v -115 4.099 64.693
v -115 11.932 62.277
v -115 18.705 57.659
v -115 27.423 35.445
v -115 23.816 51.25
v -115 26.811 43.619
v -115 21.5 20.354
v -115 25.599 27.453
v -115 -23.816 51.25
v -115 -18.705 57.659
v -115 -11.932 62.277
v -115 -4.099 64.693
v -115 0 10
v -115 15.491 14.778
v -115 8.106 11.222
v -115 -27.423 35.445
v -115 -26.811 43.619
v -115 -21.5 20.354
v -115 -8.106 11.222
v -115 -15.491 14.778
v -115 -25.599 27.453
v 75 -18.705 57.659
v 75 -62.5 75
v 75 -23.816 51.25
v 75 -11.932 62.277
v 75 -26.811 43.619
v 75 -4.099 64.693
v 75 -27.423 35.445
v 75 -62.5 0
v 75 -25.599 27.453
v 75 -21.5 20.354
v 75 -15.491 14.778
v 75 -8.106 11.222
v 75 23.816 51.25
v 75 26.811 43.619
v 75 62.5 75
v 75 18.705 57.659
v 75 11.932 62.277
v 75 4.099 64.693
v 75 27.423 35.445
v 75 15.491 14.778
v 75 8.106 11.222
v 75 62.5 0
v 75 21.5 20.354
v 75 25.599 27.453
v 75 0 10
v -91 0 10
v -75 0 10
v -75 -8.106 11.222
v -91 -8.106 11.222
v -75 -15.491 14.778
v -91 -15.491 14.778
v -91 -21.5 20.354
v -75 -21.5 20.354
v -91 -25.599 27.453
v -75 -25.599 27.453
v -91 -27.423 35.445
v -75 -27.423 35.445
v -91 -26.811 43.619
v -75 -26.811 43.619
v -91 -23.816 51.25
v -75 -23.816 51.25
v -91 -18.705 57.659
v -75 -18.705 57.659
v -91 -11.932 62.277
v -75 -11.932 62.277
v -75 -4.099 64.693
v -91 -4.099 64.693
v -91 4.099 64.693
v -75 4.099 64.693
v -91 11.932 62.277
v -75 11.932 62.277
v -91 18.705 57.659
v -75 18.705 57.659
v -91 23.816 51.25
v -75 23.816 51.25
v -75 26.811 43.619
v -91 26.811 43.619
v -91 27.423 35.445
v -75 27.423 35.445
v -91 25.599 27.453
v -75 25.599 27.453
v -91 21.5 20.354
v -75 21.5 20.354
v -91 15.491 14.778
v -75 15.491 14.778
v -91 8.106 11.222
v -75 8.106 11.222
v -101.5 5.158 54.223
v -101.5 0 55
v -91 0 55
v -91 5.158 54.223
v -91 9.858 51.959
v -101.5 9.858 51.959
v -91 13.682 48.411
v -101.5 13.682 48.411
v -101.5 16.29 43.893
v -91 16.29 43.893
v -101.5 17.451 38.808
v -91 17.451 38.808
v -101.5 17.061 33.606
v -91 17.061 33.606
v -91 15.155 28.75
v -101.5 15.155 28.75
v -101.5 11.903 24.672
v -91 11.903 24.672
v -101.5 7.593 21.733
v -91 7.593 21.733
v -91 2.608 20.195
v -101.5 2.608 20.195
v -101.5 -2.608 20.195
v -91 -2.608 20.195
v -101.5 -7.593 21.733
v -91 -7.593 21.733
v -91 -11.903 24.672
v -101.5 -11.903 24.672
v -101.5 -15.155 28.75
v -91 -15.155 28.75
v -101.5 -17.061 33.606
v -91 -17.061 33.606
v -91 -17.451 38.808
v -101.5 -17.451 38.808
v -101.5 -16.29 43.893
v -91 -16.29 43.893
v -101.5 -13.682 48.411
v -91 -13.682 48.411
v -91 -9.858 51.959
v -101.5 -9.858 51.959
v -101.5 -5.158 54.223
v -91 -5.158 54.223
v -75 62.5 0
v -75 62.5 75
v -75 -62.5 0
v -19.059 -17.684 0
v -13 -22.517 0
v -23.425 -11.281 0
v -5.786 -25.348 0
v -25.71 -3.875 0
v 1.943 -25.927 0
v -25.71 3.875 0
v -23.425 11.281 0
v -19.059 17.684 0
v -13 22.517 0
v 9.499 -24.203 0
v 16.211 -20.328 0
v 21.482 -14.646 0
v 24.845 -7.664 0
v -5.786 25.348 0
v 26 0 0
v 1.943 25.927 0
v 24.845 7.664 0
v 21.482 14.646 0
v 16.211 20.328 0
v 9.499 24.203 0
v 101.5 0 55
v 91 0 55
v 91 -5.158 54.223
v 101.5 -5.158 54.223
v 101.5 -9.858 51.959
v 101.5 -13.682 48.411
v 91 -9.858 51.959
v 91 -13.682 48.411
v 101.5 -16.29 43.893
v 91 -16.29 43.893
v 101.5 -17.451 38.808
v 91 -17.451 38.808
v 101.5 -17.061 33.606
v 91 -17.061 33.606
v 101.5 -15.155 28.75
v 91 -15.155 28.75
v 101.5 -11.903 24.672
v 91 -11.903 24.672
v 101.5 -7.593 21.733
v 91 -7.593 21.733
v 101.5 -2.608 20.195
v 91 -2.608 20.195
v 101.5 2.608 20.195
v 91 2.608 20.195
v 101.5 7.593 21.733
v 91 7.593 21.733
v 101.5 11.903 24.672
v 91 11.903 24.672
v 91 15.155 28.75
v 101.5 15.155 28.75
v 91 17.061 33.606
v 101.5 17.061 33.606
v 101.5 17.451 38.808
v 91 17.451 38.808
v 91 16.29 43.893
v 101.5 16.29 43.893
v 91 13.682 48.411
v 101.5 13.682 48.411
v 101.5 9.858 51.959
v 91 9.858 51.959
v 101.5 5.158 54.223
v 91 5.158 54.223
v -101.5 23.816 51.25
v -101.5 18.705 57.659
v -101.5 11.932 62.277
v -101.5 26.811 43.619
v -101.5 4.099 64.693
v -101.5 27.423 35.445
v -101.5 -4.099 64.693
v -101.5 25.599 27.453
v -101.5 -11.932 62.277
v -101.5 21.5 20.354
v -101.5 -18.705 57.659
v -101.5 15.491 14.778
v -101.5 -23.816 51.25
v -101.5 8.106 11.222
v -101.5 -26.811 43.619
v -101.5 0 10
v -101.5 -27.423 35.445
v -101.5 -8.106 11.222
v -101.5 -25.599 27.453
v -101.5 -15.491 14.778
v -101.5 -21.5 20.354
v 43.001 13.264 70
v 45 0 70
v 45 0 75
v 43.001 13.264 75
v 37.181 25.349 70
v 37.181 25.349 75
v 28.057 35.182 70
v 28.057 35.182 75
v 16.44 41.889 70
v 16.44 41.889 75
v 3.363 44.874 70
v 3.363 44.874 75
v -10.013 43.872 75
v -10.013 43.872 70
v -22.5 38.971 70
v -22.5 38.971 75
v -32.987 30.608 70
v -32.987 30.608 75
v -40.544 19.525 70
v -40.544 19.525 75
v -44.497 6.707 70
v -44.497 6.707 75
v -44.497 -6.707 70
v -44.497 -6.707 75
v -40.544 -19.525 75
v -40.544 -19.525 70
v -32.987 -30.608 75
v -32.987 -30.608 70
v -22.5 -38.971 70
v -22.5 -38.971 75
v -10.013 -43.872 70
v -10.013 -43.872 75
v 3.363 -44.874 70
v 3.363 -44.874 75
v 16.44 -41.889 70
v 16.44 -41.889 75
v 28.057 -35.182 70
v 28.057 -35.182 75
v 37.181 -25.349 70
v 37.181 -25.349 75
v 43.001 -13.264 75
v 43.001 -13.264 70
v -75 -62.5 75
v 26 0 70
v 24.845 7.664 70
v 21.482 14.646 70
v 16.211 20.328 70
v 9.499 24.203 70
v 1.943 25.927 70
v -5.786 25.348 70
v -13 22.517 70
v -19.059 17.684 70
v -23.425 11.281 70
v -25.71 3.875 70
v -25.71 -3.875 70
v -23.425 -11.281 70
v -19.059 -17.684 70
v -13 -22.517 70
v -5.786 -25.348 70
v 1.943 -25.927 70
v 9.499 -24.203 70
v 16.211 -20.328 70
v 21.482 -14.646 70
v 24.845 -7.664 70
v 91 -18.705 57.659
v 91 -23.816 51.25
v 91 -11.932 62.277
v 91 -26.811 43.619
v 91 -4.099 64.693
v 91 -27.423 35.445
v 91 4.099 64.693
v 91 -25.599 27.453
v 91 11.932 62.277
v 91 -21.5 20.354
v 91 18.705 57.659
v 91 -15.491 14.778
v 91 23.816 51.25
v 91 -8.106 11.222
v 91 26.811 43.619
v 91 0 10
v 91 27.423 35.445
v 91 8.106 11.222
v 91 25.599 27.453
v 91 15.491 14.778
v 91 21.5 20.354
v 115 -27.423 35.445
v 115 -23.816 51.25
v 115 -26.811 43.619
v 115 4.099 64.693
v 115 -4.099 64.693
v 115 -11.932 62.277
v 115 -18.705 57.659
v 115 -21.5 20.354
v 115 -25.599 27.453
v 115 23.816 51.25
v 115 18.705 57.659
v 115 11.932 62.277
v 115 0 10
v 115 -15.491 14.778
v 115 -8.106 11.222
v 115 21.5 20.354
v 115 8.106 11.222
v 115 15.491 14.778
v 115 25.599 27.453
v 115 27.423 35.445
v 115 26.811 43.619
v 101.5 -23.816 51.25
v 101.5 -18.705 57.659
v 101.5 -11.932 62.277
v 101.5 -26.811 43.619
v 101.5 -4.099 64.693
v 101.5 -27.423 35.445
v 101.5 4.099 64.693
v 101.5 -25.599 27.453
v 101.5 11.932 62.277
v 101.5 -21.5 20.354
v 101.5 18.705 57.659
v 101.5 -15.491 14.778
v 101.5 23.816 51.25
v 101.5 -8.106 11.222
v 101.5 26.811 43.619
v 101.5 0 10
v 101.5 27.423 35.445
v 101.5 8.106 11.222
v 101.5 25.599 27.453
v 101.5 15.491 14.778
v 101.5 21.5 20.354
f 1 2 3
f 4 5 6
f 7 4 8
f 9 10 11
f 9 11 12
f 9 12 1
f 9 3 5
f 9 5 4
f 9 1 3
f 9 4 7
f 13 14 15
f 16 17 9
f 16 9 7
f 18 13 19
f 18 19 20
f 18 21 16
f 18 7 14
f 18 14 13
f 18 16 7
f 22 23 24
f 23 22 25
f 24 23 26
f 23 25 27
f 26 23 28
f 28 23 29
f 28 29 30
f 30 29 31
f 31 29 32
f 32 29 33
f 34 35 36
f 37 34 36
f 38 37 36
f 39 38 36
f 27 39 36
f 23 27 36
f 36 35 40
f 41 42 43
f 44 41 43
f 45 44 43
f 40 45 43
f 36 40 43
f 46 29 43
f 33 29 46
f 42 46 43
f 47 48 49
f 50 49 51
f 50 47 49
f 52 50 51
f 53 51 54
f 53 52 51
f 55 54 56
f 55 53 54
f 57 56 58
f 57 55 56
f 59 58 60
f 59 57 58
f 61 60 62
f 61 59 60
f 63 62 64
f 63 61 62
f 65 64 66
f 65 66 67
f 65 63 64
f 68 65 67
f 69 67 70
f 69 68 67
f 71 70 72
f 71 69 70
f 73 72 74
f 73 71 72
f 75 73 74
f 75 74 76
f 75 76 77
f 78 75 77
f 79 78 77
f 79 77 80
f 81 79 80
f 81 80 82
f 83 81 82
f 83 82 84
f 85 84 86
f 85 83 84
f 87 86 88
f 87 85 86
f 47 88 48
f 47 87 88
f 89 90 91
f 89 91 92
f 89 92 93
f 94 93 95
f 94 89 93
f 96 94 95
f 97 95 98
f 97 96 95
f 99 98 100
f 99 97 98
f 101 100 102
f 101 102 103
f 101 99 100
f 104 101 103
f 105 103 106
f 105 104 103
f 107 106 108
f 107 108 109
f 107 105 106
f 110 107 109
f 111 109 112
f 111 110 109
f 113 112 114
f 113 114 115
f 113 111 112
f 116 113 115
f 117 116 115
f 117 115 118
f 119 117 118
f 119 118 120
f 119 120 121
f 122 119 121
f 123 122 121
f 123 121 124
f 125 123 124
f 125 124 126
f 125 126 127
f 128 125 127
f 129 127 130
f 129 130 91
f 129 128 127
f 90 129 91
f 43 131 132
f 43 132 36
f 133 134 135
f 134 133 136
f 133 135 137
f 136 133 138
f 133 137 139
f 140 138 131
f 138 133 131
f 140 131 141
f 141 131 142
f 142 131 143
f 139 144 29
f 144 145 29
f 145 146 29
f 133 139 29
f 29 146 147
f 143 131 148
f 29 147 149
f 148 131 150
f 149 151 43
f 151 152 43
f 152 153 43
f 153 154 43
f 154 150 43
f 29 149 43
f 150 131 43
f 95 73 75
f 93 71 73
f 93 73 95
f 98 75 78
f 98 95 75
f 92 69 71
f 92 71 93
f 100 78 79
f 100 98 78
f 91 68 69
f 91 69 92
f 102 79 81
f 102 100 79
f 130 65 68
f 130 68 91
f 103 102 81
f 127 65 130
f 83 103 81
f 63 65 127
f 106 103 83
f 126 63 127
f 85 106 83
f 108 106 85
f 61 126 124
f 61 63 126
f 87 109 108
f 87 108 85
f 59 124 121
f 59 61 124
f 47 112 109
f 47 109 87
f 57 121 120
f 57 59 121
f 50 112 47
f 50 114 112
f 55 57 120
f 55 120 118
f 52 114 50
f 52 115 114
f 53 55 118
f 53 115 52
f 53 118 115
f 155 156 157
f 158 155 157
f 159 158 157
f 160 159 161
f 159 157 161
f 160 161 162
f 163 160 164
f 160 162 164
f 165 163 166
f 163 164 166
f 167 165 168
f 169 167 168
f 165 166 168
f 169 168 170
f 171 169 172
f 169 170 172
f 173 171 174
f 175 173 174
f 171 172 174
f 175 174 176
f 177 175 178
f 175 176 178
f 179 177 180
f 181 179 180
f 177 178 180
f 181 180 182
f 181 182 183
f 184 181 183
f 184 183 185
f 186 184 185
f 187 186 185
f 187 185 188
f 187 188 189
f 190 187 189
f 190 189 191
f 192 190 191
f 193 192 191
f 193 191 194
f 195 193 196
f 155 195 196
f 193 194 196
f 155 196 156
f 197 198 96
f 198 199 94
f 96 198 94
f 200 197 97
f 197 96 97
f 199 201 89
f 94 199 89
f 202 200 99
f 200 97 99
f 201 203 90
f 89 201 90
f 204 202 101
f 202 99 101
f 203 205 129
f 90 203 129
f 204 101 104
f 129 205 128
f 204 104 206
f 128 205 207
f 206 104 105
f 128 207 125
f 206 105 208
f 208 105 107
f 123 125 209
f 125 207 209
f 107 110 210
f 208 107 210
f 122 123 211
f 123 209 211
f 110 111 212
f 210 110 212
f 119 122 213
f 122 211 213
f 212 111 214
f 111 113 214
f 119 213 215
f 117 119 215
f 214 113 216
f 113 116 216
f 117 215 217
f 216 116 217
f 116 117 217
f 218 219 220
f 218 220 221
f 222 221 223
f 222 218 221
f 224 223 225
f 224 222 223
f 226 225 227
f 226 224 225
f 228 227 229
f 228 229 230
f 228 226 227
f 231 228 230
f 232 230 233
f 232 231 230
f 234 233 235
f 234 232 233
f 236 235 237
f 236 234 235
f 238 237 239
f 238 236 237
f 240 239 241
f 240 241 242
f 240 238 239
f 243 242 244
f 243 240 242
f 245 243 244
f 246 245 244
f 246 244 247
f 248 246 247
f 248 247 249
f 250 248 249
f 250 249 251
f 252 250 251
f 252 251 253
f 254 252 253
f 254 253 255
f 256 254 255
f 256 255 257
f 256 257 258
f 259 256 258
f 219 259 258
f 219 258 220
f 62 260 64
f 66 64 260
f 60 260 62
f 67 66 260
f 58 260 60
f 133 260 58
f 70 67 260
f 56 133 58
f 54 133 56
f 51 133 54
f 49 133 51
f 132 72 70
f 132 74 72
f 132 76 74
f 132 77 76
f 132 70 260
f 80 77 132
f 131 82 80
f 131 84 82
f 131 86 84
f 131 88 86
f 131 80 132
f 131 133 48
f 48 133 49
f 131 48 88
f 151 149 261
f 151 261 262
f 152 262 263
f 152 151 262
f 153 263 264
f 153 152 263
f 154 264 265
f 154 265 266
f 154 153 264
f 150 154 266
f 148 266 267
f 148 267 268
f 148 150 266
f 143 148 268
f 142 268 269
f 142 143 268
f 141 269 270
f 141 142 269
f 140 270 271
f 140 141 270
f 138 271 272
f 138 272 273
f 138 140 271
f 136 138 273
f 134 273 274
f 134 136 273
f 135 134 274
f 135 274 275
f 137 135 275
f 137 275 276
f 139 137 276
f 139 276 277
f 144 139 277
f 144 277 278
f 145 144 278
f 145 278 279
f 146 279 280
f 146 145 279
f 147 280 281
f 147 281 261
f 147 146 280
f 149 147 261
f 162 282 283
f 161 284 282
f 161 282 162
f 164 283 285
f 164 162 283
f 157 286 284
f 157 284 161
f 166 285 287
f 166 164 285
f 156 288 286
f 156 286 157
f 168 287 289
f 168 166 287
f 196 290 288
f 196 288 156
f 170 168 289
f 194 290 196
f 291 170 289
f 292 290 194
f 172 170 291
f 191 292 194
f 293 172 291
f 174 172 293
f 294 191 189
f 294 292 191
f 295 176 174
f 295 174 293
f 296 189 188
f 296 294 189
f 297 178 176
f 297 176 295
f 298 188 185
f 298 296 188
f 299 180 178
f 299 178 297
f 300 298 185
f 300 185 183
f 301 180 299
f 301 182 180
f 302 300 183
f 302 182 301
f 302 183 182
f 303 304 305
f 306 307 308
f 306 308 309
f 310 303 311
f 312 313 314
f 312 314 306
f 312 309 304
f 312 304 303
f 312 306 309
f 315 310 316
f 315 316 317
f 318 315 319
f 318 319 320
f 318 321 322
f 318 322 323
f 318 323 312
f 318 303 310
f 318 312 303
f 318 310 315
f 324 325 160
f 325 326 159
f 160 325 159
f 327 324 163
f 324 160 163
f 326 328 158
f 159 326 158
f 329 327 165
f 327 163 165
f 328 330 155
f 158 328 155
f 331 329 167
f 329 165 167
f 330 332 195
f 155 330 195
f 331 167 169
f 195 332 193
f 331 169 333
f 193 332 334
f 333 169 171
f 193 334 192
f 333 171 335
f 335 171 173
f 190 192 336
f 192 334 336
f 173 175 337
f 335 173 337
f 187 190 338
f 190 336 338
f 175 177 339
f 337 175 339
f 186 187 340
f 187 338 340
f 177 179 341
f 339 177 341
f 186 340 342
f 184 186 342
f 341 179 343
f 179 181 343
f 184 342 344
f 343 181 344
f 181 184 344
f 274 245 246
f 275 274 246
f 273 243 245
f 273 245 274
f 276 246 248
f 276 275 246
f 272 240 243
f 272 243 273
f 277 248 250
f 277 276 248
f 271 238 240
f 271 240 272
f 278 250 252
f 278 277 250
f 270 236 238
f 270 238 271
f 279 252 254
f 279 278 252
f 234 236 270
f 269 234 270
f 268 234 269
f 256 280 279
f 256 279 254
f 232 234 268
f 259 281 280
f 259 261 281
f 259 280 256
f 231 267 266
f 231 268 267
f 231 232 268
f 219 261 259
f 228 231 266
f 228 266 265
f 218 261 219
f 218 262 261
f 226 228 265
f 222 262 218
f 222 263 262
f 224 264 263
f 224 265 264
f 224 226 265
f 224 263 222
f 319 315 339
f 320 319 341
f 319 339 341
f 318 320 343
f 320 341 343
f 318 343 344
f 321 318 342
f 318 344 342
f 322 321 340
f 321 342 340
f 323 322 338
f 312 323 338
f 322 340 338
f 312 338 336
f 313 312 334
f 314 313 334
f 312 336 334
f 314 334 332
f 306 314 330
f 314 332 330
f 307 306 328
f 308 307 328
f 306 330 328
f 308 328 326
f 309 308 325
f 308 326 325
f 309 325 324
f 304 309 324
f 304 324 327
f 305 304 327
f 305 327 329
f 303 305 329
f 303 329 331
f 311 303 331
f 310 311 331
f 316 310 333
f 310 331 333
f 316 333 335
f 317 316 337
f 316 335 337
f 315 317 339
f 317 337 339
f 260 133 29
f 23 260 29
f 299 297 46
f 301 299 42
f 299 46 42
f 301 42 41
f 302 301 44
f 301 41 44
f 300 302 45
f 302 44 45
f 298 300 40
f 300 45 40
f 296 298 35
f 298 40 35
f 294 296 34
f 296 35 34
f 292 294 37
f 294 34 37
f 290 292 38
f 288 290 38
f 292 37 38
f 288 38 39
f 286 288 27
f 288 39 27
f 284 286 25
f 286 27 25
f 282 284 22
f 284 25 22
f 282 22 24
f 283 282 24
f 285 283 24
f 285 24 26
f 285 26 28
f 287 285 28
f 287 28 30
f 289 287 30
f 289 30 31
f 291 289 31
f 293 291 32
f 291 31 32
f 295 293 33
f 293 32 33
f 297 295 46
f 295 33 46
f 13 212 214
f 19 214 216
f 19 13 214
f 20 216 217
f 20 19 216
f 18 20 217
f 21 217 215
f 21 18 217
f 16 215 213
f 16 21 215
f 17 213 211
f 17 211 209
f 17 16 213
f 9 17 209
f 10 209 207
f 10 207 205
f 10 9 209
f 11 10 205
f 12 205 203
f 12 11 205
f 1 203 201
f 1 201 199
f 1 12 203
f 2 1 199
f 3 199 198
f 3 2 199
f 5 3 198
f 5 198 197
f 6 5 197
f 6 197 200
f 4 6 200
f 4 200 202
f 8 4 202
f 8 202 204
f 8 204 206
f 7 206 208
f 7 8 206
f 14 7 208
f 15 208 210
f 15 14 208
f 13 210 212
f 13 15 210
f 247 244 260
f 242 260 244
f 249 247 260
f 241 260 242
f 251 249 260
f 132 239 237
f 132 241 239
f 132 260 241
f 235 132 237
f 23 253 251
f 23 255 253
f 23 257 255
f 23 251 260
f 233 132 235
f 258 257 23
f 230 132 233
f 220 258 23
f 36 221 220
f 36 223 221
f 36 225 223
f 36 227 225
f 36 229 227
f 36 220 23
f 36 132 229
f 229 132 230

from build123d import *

# Parameters (mm, degrees)
SKETCH1_W            = 150
SKETCH1_H            = 125
SKETCH1_R            = 45
BOSS_EXTRUDE2_DEPTH  = 75
SKETCH1_5_R          = 45
SKETCH1_5_R_2        = 26
BOSS_EXTRUDE3_DEPTH  = 70
SKETCH6_R            = 27.5
BOSS_EXTRUDE5_DEPTH  = 16
SKETCH7_R            = 17.5
BOSS_EXTRUDE6_DEPTH  = 10.5
SKETCH8_R            = 27.5
BOSS_EXTRUDE7_DEPTH  = 13.5
BOSS_EXTRUDE8_START  = 16
SKETCH9_R            = 27.5
BOSS_EXTRUDE8_DEPTH  = 16
BOSS_EXTRUDE9_START  = 10.5
SKETCH10_R           = 17.5
BOSS_EXTRUDE9_DEPTH  = 10.5
BOSS_EXTRUDE10_START = 13.5
SKETCH11_R           = 27.5
BOSS_EXTRUDE10_DEPTH = 13.5


with BuildPart() as part:
    # Sketch1 → Boss-Extrude2 (new body)
    with BuildSketch(Plane.XY):
        Rectangle(SKETCH1_W, SKETCH1_H)
        Circle(SKETCH1_R, mode=Mode.SUBTRACT)
    extrude(amount=BOSS_EXTRUDE2_DEPTH)

    # Sketch1<5> → Boss-Extrude3 (add)
    with BuildSketch(Plane.XY):
        Circle(SKETCH1_5_R)
        Circle(SKETCH1_5_R_2, mode=Mode.SUBTRACT)
    extrude(amount=BOSS_EXTRUDE3_DEPTH)

    # Sketch6 → Boss-Extrude5 (add)
    with BuildSketch(Plane(origin=(75, 0, 0), x_dir=(0, 0, -1), z_dir=(1, 0, 0))):
        with Locations((-37.5, 0)):
            Circle(SKETCH6_R)
    extrude(amount=BOSS_EXTRUDE5_DEPTH)

    # Sketch7 → Boss-Extrude6 (add)
    with BuildSketch(Plane(origin=(91, 0, 0), x_dir=(0, 0, -1), z_dir=(1, 0, 0))):
        with Locations((-37.5, 0)):
            Circle(SKETCH7_R)
    extrude(amount=BOSS_EXTRUDE6_DEPTH)

    # Sketch8 → Boss-Extrude7 (add)
    with BuildSketch(Plane(origin=(101.5, 0, 0), x_dir=(0, 0, -1), z_dir=(1, 0, 0))):
        with Locations((-37.5, 0)):
            Circle(SKETCH8_R)
    extrude(amount=BOSS_EXTRUDE7_DEPTH)

    # Sketch9 → Boss-Extrude8 (add)
    with BuildSketch(Plane.ZY.offset(75).offset(BOSS_EXTRUDE8_START)):
        with Locations((37.5, 0)):
            Circle(SKETCH9_R)
    extrude(amount=-BOSS_EXTRUDE8_DEPTH)

    # Sketch10 → Boss-Extrude9 (add)
    with BuildSketch(Plane.ZY.offset(91).offset(BOSS_EXTRUDE9_START)):
        with Locations((37.5, 0)):
            Circle(SKETCH10_R)
    extrude(amount=-BOSS_EXTRUDE9_DEPTH)

    # Sketch11 → Boss-Extrude10 (add)
    with BuildSketch(Plane.ZY.offset(101.5).offset(BOSS_EXTRUDE10_START)):
        with Locations((37.5, 0)):
            Circle(SKETCH11_R)
    extrude(amount=-BOSS_EXTRUDE10_DEPTH)


solid = part.part
